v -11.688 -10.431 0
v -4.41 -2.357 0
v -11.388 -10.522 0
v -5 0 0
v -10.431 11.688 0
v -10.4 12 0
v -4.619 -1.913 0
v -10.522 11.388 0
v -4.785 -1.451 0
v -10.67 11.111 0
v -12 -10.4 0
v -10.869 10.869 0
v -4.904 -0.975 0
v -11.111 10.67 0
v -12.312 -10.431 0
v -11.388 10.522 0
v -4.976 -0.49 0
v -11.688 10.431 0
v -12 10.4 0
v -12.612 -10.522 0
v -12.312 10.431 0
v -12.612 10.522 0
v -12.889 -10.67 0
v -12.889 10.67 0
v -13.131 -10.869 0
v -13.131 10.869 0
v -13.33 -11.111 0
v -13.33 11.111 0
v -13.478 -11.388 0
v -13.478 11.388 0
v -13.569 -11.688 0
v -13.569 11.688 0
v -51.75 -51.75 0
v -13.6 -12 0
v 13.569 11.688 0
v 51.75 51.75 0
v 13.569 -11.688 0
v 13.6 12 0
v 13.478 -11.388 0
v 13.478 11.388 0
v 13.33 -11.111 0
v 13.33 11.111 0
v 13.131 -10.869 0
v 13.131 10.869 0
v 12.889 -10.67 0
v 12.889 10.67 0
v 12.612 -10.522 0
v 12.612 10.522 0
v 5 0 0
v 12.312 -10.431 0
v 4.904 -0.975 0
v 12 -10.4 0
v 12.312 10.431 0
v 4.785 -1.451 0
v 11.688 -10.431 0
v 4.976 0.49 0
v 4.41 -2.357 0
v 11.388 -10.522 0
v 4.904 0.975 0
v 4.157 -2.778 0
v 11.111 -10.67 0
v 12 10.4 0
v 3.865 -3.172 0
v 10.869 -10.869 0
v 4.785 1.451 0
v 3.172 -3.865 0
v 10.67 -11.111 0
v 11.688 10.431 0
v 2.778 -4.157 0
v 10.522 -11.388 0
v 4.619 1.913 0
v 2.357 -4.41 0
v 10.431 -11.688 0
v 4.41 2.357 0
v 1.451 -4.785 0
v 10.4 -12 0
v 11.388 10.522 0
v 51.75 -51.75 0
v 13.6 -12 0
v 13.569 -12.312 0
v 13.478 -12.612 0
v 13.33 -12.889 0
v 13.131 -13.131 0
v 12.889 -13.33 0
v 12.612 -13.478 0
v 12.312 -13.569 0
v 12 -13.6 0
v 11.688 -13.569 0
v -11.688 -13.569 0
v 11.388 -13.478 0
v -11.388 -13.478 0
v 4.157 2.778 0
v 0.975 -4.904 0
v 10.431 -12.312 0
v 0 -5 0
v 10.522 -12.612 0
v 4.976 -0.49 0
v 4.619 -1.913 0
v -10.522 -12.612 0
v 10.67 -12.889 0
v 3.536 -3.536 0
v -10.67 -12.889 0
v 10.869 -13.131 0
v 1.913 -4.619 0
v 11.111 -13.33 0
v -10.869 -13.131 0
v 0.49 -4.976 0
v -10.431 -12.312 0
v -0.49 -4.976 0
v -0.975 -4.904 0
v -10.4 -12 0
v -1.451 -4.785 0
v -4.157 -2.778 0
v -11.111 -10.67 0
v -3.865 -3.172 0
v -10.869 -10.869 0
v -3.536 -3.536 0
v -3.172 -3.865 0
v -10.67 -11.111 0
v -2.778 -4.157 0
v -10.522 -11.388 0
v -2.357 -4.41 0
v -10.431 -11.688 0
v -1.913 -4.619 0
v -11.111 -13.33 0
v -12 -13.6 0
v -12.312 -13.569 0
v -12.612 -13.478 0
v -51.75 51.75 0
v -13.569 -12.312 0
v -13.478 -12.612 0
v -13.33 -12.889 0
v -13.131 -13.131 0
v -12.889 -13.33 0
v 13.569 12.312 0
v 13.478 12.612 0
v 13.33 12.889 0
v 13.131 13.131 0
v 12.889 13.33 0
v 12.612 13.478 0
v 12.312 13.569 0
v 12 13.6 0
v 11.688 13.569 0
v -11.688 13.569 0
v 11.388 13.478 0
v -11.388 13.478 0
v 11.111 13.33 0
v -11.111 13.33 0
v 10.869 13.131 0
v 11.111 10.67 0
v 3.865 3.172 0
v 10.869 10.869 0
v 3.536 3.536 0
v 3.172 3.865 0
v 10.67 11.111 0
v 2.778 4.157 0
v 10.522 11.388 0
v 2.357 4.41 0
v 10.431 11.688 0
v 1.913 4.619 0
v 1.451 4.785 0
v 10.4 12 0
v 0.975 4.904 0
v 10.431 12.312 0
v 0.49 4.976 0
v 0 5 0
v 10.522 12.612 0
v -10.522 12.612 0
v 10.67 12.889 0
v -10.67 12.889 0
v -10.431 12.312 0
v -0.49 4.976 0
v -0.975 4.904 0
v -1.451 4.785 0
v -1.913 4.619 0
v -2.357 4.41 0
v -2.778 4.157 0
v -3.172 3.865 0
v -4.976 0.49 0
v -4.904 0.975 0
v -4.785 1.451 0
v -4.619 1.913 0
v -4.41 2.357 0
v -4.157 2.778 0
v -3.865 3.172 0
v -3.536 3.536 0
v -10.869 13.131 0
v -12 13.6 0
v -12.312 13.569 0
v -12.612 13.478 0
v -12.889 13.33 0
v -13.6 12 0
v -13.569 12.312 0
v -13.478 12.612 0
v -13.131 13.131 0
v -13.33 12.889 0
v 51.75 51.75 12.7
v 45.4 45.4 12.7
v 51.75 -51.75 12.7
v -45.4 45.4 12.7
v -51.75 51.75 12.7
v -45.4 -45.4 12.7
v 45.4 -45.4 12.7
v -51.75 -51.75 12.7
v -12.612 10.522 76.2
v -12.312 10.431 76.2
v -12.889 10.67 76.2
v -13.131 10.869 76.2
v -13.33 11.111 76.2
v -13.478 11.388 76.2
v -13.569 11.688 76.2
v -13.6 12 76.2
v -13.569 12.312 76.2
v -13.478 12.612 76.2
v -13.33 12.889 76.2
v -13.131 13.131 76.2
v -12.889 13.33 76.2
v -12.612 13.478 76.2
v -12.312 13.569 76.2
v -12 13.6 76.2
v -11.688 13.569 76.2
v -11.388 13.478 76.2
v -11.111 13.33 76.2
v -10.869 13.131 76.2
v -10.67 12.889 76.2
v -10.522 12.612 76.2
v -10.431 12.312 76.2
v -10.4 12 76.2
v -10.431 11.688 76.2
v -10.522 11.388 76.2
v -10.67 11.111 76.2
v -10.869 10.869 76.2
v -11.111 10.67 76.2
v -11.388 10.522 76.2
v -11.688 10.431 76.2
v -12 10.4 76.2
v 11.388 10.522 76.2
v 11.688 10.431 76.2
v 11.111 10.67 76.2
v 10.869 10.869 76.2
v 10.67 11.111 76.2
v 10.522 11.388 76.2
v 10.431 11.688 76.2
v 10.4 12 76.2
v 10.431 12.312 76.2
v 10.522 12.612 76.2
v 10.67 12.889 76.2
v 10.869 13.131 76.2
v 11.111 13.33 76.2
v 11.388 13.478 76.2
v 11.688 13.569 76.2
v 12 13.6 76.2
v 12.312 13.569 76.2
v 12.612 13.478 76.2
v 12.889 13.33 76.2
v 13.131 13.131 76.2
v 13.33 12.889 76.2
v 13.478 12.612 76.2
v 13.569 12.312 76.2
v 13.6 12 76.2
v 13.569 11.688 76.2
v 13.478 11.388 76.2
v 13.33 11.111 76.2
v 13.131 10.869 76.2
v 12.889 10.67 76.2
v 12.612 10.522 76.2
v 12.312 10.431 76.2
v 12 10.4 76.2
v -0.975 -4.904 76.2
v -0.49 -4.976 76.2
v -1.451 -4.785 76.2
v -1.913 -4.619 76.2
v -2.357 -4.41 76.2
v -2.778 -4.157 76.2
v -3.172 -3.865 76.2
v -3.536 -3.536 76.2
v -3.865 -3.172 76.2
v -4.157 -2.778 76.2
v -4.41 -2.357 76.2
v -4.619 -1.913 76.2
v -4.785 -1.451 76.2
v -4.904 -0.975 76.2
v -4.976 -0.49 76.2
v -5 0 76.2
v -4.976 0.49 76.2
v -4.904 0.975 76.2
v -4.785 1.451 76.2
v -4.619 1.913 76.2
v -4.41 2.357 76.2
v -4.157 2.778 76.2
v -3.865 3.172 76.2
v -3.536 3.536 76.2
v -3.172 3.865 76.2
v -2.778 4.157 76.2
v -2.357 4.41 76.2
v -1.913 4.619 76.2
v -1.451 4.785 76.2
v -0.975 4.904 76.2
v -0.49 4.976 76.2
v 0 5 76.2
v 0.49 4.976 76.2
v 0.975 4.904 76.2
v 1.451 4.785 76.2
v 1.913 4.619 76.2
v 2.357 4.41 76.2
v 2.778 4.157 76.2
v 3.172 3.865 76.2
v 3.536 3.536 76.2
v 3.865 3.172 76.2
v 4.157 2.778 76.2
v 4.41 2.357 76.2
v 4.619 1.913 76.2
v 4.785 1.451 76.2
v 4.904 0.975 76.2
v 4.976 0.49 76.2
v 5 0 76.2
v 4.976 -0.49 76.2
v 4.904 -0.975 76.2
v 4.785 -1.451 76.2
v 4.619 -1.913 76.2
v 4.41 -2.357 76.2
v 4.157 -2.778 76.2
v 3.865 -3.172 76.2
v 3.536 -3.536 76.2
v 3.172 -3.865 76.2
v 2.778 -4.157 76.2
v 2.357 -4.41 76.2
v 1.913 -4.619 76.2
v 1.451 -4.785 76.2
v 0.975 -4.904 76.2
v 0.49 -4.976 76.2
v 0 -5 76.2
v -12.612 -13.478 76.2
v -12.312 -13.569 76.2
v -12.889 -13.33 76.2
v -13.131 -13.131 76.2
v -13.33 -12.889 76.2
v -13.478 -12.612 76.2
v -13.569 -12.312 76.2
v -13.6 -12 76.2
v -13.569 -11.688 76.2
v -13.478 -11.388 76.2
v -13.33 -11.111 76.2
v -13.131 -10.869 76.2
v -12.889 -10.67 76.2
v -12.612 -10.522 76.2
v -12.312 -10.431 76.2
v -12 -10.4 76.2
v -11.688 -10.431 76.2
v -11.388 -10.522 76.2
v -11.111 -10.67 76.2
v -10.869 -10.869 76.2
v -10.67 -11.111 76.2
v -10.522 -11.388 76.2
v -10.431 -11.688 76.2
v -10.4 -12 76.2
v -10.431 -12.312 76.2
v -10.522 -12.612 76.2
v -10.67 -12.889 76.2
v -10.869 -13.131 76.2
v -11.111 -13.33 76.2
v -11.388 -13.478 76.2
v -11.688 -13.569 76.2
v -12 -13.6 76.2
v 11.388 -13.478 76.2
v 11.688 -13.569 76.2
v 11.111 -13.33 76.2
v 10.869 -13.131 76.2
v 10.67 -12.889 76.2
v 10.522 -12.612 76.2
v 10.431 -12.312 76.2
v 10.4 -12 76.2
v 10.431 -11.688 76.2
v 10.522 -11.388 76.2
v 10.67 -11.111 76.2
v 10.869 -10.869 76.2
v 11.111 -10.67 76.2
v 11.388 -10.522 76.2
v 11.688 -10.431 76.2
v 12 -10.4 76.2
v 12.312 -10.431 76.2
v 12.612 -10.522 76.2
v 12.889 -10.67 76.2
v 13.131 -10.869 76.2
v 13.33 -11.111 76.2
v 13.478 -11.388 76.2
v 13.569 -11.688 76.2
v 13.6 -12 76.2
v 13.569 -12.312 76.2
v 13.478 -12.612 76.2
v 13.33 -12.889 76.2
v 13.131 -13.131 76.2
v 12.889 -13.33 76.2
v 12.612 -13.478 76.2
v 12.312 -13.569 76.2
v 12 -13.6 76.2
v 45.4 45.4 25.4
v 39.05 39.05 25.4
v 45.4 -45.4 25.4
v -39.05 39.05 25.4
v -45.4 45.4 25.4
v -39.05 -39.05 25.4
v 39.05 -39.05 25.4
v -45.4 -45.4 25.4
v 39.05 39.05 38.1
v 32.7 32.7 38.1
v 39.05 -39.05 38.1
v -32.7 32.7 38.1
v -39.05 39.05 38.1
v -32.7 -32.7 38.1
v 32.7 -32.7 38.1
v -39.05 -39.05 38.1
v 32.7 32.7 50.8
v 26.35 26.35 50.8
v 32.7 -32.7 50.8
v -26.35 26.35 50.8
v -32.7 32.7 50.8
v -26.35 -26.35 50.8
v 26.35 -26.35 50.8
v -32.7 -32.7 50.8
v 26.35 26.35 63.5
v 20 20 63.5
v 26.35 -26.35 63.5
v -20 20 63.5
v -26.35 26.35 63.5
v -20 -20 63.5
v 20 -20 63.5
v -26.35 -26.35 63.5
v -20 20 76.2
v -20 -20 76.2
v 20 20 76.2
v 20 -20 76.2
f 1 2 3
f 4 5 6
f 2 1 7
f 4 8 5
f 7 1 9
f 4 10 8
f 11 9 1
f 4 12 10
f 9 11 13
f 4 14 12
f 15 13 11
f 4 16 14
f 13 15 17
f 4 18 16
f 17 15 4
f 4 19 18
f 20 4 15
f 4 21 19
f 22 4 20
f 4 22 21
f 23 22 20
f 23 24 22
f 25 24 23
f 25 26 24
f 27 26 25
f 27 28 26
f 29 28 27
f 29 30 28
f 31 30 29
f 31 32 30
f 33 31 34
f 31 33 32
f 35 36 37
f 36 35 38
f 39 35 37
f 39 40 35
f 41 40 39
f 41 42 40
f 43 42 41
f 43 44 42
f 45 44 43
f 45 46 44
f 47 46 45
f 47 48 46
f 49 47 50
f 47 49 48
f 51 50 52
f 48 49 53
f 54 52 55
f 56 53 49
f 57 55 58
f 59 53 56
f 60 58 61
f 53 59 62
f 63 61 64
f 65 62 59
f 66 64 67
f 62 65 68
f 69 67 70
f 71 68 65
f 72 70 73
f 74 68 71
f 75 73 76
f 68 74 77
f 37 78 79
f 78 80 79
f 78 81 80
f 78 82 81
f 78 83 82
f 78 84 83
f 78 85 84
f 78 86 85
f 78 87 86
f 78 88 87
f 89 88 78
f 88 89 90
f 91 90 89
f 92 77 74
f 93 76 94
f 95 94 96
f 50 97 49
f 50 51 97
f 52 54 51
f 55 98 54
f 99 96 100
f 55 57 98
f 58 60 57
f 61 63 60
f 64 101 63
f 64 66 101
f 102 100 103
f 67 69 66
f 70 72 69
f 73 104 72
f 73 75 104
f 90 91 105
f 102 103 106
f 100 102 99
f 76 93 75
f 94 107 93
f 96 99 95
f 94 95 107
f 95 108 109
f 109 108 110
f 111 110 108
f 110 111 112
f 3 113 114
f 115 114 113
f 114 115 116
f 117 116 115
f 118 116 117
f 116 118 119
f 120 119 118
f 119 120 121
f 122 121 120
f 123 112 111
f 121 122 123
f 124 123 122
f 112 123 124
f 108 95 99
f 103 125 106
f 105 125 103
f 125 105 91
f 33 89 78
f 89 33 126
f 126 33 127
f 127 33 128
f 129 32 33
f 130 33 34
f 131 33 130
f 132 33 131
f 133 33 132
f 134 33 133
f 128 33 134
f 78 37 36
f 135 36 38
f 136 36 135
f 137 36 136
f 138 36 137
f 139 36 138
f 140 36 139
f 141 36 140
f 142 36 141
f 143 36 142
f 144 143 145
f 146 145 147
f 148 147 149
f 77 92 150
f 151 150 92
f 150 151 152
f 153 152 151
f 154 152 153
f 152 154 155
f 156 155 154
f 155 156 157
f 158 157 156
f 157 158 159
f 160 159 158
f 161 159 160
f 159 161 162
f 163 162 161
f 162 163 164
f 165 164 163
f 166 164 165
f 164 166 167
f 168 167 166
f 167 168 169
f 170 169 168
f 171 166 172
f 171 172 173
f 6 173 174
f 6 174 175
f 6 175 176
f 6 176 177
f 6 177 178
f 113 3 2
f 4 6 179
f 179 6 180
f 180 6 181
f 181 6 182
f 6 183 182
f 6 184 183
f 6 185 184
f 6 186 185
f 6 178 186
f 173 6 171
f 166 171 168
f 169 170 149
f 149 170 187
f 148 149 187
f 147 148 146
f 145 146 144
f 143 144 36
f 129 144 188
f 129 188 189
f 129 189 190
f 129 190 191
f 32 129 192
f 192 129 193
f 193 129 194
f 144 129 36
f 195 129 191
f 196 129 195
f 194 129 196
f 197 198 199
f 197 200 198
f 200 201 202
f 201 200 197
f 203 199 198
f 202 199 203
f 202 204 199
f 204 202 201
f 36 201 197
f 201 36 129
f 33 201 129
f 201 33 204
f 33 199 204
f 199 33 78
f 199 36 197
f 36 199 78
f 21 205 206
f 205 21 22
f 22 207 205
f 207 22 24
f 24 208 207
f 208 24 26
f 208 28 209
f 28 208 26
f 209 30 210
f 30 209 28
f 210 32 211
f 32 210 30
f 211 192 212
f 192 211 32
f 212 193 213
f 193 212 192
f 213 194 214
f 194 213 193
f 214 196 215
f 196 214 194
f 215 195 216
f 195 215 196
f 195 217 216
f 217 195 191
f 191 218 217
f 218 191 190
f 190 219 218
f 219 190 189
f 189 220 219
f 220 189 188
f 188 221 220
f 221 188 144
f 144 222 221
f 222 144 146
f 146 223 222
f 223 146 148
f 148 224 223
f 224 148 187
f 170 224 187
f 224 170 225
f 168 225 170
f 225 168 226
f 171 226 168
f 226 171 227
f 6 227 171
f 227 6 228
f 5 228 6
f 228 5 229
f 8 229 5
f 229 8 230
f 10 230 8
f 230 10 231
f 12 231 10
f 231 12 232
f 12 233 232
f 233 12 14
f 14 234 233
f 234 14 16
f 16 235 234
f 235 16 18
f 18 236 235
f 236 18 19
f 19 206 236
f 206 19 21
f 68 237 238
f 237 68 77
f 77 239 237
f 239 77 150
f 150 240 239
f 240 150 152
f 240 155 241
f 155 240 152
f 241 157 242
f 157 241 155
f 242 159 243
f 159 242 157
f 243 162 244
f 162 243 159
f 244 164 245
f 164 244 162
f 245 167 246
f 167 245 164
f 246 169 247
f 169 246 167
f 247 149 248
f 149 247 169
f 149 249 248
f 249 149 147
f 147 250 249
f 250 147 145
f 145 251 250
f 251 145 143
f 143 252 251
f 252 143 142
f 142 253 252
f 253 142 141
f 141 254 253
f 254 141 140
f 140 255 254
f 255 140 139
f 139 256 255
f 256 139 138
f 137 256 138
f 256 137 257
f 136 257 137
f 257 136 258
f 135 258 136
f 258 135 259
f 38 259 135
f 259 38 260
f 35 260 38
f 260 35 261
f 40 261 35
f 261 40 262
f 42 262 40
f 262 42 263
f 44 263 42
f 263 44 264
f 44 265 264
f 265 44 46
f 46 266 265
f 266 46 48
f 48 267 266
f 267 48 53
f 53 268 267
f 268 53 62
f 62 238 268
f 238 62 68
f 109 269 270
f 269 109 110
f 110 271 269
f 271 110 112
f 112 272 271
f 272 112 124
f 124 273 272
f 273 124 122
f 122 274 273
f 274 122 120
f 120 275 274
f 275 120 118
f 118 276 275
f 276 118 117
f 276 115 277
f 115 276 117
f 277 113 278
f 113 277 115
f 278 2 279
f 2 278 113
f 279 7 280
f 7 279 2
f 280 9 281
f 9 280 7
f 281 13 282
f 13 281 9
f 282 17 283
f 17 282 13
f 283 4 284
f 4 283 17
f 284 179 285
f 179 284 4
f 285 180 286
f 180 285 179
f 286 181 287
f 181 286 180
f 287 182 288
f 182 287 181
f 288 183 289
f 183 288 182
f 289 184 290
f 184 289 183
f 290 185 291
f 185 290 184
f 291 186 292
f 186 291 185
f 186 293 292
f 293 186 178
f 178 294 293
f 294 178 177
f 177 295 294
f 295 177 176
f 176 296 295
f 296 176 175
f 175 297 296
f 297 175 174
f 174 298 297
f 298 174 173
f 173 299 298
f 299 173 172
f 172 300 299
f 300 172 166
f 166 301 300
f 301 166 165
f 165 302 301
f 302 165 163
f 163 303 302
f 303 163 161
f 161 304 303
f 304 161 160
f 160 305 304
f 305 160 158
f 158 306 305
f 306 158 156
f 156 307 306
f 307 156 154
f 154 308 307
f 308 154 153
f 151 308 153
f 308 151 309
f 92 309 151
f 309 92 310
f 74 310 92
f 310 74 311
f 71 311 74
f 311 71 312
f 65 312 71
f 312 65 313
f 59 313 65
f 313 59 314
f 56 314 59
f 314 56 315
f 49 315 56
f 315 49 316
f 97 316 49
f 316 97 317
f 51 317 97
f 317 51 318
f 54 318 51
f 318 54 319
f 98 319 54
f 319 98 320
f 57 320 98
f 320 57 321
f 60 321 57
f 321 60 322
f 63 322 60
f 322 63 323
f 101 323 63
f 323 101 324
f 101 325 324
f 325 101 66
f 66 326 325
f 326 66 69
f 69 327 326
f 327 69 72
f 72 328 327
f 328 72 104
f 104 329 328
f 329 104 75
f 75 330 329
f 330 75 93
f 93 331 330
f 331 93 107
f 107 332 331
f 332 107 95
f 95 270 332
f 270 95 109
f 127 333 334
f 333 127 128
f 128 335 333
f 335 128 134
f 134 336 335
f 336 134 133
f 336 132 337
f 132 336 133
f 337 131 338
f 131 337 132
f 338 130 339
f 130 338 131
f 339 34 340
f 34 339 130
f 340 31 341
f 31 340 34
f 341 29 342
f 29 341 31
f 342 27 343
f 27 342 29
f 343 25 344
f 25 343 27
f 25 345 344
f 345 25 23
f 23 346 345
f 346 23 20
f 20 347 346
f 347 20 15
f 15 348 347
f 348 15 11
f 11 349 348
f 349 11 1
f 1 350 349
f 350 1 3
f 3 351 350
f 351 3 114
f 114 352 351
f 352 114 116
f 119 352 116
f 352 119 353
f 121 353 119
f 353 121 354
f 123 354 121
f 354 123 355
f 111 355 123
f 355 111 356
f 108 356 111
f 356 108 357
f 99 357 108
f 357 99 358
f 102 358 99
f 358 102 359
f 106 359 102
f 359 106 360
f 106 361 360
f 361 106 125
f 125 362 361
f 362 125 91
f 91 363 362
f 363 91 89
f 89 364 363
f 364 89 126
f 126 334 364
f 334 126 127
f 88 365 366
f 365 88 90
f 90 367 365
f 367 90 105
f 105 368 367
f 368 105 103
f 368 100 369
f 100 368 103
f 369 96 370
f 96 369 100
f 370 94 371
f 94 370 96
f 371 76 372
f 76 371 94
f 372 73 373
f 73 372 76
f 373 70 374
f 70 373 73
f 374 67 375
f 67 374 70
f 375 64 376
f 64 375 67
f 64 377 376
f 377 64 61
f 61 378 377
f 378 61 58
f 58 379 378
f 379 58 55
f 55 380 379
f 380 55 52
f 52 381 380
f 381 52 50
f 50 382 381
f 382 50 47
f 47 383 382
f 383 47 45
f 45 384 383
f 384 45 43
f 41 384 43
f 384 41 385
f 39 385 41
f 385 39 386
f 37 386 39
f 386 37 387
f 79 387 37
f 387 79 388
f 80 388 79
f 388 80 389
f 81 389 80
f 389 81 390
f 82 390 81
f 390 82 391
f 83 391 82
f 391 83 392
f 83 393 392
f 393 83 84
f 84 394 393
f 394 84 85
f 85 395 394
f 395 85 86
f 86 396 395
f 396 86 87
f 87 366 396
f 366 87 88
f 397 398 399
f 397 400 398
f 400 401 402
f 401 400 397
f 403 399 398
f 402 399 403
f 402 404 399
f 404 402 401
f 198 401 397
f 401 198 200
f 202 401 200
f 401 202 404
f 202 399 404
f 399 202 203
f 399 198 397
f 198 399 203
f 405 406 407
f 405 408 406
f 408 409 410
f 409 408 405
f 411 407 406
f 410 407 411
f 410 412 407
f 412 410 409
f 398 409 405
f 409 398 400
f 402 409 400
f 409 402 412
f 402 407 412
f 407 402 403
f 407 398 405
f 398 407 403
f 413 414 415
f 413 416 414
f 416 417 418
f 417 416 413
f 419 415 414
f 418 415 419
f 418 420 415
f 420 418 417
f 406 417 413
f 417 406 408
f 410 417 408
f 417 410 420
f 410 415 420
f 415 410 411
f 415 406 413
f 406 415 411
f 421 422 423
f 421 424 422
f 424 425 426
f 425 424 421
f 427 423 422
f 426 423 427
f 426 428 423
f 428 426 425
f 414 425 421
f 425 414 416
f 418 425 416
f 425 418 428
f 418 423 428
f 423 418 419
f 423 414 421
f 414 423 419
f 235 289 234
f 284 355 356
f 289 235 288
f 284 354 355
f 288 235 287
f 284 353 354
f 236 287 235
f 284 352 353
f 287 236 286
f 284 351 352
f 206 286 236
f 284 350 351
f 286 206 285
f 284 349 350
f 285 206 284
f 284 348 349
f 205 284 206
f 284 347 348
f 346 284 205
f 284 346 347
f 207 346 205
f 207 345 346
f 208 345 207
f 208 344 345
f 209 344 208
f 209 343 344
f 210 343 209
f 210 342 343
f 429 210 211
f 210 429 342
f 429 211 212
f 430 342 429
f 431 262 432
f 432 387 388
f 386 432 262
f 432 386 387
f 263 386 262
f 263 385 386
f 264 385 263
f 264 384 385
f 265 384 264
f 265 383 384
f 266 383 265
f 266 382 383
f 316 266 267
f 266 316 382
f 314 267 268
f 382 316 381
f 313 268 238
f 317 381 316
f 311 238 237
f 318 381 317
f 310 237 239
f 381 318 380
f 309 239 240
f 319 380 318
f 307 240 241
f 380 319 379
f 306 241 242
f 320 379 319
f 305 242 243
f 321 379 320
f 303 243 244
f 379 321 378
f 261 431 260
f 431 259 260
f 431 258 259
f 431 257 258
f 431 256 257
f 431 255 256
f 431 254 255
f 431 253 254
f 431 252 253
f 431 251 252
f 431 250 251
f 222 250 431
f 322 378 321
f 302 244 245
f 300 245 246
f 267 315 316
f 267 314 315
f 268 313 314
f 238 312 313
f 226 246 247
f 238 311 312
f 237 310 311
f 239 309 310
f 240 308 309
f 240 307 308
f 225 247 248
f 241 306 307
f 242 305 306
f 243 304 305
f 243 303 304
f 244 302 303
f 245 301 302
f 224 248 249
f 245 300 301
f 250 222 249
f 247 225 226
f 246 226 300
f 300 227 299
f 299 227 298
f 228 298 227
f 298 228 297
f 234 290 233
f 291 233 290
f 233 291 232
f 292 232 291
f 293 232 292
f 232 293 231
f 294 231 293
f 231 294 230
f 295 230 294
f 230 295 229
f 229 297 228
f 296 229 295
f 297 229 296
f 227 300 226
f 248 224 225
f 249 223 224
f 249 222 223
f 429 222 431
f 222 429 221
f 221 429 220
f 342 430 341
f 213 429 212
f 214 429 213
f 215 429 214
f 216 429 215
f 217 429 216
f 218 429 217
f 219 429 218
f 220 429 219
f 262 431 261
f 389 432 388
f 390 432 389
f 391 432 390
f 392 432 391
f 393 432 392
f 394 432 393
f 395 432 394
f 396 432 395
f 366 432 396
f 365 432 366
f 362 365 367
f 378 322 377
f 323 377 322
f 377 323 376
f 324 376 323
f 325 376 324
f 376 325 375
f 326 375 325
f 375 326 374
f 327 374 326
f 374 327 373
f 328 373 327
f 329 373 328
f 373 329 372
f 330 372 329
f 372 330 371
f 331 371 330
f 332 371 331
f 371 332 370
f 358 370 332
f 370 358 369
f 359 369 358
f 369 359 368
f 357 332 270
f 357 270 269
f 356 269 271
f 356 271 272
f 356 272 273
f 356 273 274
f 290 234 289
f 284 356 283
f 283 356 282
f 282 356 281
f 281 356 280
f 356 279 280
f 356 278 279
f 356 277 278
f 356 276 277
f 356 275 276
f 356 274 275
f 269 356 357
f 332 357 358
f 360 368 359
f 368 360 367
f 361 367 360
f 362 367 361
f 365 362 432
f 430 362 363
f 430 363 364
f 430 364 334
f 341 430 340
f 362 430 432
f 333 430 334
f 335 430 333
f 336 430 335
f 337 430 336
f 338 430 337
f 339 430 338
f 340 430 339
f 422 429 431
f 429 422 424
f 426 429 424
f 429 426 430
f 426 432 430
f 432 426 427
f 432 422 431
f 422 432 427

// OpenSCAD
// === Parameters ===
num_layers = 6;
ply_thickness = 12.7;            // Default 1/2" plywood
top_size_mm = 40;                // Width/Length of the top layer
layer_inc_mm = 12.7;             // Increase per layer from top to bottom
center_bore_diameter = 10;       // Bore hole in center
register_hole_diameter = 3.2;
register_hole_offset = 12;       // Offset from center on X/Y

// === Computed Dimensions ===
base_size_mm = top_size_mm + (num_layers - 1) * layer_inc_mm;
total_height_mm = num_layers * ply_thickness;
echo(str("Base Size: ", base_size_mm, " mm"));
echo(str("Total Height: ", total_height_mm, " mm"));

module pyramid_layer(size) {
    difference() {
        square([size, size], center=true);
        // Center bore
        translate([0, 0]) circle(d=center_bore_diameter, $fn=64);
        // Register holes at 4 quadrants (optional)
        for (x_sign = [-1, 1], y_sign = [-1, 1]) {
            translate([x_sign * register_hole_offset, y_sign * register_hole_offset])
                circle(d=register_hole_diameter, $fn=32);
        }
    }
}

module pyramid() {
    for (i = [0 : num_layers - 1]) {
        layer_size = top_size_mm + (num_layers - 1 - i) * layer_inc_mm;
        translate([0, 0, i * ply_thickness])
            linear_extrude(height = ply_thickness)
                pyramid_layer(layer_size);
    }
}

// === Render ===
pyramid();
